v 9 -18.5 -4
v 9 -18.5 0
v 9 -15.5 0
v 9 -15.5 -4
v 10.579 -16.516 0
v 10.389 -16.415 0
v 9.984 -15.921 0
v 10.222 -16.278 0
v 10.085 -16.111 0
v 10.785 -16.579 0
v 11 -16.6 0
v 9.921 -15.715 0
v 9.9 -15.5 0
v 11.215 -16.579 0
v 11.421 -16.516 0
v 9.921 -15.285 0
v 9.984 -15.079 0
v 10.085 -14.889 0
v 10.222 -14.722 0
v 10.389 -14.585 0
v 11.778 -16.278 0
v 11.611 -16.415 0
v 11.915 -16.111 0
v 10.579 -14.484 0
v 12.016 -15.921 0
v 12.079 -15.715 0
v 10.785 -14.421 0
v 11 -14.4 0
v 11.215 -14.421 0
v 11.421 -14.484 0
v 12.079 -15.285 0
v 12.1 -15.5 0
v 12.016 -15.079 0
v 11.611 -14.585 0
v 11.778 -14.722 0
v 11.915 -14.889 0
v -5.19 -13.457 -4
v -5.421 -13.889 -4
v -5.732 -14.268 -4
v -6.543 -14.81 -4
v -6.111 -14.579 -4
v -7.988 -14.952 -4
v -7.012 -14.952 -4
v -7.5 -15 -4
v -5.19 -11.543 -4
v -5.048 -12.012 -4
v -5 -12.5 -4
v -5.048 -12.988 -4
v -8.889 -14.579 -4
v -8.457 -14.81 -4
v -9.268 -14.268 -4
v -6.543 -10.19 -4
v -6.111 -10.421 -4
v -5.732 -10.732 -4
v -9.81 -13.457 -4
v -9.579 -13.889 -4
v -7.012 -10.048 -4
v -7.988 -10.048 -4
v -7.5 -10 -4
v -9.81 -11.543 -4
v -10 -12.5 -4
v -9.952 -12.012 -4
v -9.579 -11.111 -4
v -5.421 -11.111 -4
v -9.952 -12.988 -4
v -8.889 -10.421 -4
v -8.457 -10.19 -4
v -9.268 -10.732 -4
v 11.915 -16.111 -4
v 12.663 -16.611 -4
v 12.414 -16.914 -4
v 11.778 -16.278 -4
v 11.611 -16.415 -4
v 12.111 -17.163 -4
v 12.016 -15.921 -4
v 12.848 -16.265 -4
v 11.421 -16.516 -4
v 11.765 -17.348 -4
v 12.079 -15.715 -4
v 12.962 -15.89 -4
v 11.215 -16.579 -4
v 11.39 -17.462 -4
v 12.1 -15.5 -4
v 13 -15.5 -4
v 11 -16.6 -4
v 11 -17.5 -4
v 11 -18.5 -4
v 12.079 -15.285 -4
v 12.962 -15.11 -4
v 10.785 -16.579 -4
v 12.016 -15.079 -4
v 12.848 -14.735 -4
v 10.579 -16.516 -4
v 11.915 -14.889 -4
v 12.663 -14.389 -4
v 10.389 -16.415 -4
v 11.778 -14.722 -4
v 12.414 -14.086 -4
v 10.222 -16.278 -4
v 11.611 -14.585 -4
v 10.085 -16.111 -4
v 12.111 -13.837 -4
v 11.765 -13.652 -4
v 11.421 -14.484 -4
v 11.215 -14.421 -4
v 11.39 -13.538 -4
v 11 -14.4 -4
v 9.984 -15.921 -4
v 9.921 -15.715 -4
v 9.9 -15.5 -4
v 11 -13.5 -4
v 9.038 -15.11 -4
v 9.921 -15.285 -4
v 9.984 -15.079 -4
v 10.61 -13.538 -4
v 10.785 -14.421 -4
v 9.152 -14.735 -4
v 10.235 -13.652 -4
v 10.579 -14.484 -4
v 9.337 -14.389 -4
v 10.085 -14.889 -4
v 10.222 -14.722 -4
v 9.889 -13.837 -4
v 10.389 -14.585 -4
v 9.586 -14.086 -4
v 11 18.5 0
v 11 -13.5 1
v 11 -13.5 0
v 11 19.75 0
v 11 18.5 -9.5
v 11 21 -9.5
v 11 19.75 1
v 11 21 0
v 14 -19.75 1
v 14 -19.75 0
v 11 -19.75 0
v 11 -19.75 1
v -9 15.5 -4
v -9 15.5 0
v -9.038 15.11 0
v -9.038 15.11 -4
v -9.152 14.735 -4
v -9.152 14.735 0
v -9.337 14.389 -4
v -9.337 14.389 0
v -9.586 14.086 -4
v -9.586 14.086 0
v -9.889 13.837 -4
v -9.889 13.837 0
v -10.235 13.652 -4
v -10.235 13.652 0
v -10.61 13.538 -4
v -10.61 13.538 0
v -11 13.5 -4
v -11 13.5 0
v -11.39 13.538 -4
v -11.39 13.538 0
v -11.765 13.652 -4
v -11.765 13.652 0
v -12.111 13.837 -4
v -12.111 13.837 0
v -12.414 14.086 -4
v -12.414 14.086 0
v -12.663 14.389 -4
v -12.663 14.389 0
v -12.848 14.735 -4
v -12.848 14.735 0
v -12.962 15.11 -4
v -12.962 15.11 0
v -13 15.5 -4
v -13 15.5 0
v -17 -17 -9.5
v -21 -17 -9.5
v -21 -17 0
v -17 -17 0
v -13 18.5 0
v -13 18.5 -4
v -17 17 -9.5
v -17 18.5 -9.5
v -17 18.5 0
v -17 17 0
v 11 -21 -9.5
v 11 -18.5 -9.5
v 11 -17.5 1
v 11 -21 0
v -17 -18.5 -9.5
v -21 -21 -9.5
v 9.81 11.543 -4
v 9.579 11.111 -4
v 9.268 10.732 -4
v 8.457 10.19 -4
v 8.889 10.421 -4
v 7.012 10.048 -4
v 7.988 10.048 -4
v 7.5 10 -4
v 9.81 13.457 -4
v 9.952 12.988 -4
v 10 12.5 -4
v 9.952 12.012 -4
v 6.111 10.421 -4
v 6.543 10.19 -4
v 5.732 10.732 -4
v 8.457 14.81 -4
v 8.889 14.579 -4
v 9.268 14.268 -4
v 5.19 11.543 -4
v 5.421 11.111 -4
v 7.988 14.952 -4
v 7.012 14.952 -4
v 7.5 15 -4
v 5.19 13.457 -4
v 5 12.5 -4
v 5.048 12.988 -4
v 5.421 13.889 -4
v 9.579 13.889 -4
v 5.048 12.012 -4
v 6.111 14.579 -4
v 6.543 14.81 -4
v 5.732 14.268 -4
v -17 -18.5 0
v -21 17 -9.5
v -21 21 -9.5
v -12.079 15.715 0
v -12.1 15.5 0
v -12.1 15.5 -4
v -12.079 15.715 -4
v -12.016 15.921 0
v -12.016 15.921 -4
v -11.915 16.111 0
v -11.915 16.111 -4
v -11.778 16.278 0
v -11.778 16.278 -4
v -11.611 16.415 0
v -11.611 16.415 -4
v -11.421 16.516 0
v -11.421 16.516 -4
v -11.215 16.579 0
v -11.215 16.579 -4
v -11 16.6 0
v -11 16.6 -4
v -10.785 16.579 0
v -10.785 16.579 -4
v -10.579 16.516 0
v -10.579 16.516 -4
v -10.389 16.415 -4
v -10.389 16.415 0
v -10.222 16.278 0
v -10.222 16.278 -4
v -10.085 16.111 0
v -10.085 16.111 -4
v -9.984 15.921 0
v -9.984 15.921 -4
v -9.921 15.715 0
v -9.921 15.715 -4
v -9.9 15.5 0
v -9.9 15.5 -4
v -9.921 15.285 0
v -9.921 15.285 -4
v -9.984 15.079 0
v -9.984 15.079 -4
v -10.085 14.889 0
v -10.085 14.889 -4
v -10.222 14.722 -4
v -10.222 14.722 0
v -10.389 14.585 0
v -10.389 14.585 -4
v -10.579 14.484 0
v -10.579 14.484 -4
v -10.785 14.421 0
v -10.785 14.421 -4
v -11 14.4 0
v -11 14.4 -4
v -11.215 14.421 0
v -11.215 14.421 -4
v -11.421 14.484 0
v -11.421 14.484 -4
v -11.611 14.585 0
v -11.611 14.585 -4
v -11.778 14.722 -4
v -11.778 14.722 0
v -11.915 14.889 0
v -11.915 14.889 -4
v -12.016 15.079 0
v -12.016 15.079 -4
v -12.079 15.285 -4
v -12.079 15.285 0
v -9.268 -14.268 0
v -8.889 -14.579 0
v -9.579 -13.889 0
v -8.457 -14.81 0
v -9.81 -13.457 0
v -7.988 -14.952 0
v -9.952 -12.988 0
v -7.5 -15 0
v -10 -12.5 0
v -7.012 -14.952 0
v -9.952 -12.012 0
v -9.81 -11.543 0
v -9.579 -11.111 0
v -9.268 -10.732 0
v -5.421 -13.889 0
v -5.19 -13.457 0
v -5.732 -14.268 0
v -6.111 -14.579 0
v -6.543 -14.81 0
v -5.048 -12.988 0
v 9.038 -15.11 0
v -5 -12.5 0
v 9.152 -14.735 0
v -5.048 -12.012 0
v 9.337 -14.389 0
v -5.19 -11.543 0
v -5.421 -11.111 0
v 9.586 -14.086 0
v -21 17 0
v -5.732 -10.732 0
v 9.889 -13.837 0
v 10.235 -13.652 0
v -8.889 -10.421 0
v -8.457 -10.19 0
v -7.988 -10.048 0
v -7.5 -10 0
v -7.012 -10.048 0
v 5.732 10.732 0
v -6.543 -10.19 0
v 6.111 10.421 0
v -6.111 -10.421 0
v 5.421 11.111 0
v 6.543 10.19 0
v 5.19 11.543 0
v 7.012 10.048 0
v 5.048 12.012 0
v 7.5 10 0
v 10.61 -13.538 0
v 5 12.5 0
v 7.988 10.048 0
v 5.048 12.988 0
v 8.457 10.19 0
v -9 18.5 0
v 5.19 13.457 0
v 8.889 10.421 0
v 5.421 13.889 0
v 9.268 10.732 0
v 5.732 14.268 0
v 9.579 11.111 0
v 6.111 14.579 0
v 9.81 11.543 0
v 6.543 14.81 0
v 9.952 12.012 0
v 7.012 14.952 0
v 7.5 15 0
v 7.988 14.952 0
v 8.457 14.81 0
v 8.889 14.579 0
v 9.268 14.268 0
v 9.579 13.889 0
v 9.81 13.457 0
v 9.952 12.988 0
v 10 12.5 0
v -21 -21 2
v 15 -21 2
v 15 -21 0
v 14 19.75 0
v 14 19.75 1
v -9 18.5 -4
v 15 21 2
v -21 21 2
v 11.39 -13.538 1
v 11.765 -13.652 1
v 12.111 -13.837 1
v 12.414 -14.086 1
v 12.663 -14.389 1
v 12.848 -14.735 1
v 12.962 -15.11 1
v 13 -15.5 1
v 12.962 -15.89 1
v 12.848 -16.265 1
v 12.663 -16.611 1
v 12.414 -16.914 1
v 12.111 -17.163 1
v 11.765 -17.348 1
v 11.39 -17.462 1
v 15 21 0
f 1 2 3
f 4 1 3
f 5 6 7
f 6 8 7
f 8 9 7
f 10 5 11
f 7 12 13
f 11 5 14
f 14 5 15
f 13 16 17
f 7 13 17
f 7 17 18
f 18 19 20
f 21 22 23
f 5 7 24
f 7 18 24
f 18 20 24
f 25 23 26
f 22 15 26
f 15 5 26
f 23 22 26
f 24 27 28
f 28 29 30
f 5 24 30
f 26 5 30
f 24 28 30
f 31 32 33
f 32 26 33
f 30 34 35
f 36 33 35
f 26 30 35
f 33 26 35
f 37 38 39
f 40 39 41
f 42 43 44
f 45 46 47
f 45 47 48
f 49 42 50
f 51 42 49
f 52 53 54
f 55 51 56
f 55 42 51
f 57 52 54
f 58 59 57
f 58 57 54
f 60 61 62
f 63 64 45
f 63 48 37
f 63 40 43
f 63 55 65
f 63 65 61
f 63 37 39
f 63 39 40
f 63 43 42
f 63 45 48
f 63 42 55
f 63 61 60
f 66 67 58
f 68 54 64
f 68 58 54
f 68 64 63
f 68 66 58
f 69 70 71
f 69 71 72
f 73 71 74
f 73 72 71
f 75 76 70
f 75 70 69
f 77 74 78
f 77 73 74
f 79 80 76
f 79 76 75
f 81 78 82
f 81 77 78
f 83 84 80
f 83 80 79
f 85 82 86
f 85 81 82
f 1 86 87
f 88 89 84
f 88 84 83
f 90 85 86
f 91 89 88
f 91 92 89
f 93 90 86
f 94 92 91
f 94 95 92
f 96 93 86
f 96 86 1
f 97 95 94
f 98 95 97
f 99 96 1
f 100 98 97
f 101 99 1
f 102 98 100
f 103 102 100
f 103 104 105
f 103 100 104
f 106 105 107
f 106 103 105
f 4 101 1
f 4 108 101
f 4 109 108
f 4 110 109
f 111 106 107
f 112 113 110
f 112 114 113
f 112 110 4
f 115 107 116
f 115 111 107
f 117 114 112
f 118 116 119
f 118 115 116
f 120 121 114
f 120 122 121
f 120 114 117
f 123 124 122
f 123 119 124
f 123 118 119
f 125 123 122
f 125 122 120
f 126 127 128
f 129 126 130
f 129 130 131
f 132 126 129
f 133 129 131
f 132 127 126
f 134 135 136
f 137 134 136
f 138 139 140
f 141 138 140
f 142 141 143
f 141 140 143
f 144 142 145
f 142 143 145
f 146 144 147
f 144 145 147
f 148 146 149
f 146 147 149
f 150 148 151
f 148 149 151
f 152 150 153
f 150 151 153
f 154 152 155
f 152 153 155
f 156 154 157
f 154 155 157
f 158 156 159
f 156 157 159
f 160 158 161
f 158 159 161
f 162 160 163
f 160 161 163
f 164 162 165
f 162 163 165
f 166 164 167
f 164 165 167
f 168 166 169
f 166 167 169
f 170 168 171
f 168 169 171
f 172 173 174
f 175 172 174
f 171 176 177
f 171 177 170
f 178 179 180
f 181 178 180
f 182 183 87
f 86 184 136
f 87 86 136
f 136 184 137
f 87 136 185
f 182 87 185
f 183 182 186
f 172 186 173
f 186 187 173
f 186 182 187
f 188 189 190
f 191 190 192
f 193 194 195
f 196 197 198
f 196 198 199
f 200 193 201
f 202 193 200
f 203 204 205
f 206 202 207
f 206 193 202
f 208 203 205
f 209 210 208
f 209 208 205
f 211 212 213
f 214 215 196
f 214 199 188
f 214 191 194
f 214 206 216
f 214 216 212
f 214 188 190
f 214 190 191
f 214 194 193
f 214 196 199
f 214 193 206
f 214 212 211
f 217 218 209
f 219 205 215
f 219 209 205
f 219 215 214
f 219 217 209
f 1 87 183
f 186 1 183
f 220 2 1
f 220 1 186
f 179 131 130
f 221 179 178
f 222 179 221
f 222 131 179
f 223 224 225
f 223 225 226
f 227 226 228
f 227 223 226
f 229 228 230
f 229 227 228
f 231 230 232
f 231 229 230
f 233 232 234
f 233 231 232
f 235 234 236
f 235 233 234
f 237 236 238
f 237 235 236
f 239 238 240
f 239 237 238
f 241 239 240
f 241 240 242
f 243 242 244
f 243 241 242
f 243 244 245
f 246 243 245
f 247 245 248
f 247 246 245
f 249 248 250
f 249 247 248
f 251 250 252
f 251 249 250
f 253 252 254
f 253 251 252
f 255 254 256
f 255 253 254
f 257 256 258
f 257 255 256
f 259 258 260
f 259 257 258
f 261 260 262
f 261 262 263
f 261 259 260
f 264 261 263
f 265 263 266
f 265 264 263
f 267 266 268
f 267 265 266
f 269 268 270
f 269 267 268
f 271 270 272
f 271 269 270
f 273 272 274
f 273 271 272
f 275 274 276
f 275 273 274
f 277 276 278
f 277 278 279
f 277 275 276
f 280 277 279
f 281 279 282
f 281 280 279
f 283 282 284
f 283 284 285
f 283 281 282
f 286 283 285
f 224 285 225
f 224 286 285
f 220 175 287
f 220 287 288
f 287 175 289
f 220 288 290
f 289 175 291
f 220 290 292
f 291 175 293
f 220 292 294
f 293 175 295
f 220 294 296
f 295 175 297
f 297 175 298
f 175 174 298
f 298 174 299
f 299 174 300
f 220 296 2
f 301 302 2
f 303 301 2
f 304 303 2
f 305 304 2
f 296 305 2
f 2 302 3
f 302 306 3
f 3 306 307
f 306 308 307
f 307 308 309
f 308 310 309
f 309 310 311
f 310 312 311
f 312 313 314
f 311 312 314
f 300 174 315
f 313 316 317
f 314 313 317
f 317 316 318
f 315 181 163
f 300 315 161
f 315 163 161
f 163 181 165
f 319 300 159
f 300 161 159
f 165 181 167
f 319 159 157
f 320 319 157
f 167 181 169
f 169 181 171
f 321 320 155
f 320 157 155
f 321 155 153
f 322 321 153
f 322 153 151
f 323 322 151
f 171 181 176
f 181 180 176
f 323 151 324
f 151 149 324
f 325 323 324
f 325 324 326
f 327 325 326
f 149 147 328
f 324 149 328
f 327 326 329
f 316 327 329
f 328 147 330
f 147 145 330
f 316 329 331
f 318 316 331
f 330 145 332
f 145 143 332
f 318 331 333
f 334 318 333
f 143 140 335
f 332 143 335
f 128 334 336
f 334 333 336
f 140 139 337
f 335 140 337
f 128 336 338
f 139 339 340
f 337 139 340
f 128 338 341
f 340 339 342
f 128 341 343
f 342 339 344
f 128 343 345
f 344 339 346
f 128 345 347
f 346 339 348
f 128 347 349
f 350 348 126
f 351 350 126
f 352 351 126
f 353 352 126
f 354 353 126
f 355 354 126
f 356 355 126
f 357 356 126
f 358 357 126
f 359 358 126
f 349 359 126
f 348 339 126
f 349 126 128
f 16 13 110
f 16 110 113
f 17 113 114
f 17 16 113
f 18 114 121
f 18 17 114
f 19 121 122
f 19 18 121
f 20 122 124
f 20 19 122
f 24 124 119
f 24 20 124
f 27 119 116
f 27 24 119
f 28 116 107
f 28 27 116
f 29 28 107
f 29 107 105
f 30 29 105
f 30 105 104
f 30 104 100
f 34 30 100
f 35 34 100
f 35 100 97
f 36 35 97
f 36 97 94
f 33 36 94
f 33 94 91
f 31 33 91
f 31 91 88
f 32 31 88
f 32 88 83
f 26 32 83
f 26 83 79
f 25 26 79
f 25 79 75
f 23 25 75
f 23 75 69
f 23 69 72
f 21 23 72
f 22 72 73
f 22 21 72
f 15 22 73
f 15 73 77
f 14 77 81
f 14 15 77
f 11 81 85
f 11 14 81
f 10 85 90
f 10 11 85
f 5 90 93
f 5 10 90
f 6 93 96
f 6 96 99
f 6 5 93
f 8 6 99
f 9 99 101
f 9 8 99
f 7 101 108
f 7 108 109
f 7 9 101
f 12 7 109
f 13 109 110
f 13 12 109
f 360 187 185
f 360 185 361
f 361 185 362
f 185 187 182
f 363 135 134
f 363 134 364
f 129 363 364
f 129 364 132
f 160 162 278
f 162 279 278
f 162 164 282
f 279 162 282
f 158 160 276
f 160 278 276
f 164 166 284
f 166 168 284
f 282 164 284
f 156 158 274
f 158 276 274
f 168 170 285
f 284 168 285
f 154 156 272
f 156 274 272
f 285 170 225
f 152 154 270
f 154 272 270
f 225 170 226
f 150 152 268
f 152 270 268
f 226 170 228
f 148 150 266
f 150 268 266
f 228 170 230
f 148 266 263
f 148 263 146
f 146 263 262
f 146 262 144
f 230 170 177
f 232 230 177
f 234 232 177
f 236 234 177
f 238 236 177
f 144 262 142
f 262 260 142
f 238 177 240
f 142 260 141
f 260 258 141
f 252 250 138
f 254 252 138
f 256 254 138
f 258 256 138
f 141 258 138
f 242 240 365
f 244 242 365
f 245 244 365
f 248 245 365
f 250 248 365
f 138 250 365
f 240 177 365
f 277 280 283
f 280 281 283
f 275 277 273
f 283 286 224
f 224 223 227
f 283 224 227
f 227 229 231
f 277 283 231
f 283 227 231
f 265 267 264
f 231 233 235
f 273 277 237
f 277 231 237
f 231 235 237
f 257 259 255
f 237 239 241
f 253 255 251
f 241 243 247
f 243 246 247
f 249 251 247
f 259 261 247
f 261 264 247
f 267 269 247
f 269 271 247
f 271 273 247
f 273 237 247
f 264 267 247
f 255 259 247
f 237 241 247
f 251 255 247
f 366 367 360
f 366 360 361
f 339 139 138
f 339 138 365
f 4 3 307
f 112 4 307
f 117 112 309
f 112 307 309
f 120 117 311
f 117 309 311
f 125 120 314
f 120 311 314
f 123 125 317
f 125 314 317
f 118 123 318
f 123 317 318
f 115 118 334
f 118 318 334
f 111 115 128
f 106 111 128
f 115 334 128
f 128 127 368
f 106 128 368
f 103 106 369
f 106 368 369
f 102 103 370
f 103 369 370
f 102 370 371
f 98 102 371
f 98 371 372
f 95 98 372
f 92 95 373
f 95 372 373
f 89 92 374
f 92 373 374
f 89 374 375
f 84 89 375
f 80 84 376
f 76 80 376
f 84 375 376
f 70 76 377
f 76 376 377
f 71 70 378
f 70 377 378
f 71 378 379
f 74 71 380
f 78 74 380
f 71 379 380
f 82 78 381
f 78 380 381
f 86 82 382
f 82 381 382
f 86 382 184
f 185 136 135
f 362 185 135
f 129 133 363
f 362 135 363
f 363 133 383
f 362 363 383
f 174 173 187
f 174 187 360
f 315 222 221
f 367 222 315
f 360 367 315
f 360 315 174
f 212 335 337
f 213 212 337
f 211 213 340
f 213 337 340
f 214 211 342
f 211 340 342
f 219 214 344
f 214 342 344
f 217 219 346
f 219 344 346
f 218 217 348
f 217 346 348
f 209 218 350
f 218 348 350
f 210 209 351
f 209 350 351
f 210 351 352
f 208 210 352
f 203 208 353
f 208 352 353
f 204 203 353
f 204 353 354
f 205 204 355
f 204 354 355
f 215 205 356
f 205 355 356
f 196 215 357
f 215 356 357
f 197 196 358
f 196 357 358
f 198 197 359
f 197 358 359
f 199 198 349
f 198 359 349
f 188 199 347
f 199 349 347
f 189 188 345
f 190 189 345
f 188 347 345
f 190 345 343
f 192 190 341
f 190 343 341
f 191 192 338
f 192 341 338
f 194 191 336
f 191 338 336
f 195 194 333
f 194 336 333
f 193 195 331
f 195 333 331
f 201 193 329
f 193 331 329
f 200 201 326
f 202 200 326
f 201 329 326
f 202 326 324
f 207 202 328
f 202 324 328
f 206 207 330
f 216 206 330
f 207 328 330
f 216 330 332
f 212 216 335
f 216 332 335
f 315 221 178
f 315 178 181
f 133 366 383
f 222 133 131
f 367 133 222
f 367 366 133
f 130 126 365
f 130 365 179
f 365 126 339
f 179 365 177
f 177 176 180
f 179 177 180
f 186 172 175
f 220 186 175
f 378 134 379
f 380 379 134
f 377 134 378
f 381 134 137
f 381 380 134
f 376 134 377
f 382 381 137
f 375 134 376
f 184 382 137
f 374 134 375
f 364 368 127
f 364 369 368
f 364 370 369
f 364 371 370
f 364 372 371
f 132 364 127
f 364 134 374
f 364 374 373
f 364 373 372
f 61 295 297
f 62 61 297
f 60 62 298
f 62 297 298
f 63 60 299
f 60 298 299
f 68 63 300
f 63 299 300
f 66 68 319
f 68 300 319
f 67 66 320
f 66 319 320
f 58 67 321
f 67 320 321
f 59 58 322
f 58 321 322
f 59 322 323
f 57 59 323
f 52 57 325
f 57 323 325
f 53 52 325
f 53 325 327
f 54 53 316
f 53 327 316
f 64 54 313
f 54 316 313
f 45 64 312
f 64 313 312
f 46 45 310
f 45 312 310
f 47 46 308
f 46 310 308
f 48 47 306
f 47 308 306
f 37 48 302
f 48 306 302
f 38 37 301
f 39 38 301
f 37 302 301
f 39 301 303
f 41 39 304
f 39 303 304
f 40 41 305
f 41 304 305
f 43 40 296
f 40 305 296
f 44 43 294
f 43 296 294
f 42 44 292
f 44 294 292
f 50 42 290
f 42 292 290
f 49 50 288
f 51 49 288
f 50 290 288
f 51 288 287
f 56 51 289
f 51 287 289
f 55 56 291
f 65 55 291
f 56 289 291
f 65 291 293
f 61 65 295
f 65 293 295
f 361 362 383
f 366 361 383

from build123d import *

# Parameters (mm, degrees)
SKETCH_1_W          = 36
SKETCH_1_H          = 42
EXTRUDE_1_DEPTH     = 2
SKETCH_2_W          = 32
SKETCH_2_H          = 2.5
EXTRUDE_2_DEPTH     = 9.5
SKETCH_3_W          = 3
SKETCH_3_H          = 39.5
CUT_EXTRUDE_1_DEPTH = 1
SKETCH_4_R          = 2
SKETCH_4_R_2        = 1.1
EXTRUDE_3_DEPTH     = 4
SKETCH_4_2_R        = 2
EXTRUDE_4_DEPTH     = 1
EXTRUDE_5_DEPTH     = 4
EXTRUDE_6_DEPTH     = 4
SKETCH_8_R          = 2.5
EXTRUDE_7_DEPTH     = 4
SKETCH_9_W          = 9.5
SKETCH_9_H          = 1.5
EXTRUDE_8_DEPTH     = 4


with BuildPart() as part:
    # 草图1 → 凸台-拉伸1 (new body)
    with BuildSketch(Plane.XY):
        with Locations((-3, 0)):
            Rectangle(SKETCH_1_W, SKETCH_1_H)
    extrude(amount=EXTRUDE_1_DEPTH)

    # 草图2 → 凸台-拉伸2 (add)
    with BuildSketch(Plane(origin=(0, 0, 0), x_dir=(-1, 0, 0), z_dir=(0, 0, -1))):
        with Locations((5, 19.75)):
            Rectangle(SKETCH_2_W, SKETCH_2_H)
        with Locations((5, -19.75)):
            Rectangle(SKETCH_2_W, SKETCH_2_H)
    extrude(amount=EXTRUDE_2_DEPTH)

    # 草图3 → 切除-拉伸1 (cut)
    with BuildSketch(Plane(origin=(0, 0, 0), x_dir=(-1, 0, 0), z_dir=(0, 0, -1))):
        with Locations((-12.5, 0)):
            Rectangle(SKETCH_3_W, SKETCH_3_H)
    extrude(amount=-CUT_EXTRUDE_1_DEPTH, mode=Mode.SUBTRACT)

    # 草图4 → 凸台-拉伸3 (add)
    with BuildSketch(Plane(origin=(0, 0, 0), x_dir=(-1, 0, 0), z_dir=(0, 0, -1))):
        with Locations((11, 15.5)):
            Circle(SKETCH_4_R)
        with Locations((11, 15.5)):
            Circle(SKETCH_4_R_2, mode=Mode.SUBTRACT)
        with Locations((-11, -15.5)):
            Circle(SKETCH_4_R)
        with Locations((-11, -15.5)):
            Circle(SKETCH_4_R_2, mode=Mode.SUBTRACT)
    extrude(amount=EXTRUDE_3_DEPTH)

    # 草图4<2> → 凸台-拉伸4 (add)
    with BuildSketch(Plane(origin=(0, 0, 0), x_dir=(-1, 0, 0), z_dir=(0, 0, -1))):
        with Locations((-11, -15.5)):
            Circle(SKETCH_4_2_R)
    extrude(amount=-EXTRUDE_4_DEPTH)

    # 草图5 → 凸台-拉伸5 (add)
    with BuildSketch(Plane(origin=(0, 0, 0), x_dir=(-1, 0, 0), z_dir=(0, 0, -1))):
        Polygon((9, 15.5), (9, 18.5), (13, 18.5), (13, 15.5), (11, 17.5), align=None)
    extrude(amount=EXTRUDE_5_DEPTH)

    # 草图6 → 凸台-拉伸6 (add)
    with BuildSketch(Plane(origin=(0, 0, 0), x_dir=(-1, 0, 0), z_dir=(0, 0, -1))):
        Polygon((-11, -17.5), (-11, -18.5), (-9, -18.5), (-9, -15.5), align=None)
    extrude(amount=EXTRUDE_6_DEPTH)

    # 草图8 → 凸台-拉伸7 (add)
    with BuildSketch(Plane(origin=(0, 0, 0), x_dir=(-1, 0, 0), z_dir=(0, 0, -1))):
        with Locations((7.5, -12.5)):
            Circle(SKETCH_8_R)
        with Locations((-7.5, 12.5)):
            Circle(SKETCH_8_R)
    extrude(amount=EXTRUDE_7_DEPTH)

    # 草图9 → 凸台-拉伸8 (add)
    with BuildSketch(Plane.ZY.offset(21)):
        with Locations((-4.75, -17.75)):
            Rectangle(SKETCH_9_W, SKETCH_9_H)
        with Locations((-4.75, 17.75)):
            Rectangle(SKETCH_9_W, SKETCH_9_H)
    extrude(amount=-EXTRUDE_8_DEPTH)


solid = part.part
